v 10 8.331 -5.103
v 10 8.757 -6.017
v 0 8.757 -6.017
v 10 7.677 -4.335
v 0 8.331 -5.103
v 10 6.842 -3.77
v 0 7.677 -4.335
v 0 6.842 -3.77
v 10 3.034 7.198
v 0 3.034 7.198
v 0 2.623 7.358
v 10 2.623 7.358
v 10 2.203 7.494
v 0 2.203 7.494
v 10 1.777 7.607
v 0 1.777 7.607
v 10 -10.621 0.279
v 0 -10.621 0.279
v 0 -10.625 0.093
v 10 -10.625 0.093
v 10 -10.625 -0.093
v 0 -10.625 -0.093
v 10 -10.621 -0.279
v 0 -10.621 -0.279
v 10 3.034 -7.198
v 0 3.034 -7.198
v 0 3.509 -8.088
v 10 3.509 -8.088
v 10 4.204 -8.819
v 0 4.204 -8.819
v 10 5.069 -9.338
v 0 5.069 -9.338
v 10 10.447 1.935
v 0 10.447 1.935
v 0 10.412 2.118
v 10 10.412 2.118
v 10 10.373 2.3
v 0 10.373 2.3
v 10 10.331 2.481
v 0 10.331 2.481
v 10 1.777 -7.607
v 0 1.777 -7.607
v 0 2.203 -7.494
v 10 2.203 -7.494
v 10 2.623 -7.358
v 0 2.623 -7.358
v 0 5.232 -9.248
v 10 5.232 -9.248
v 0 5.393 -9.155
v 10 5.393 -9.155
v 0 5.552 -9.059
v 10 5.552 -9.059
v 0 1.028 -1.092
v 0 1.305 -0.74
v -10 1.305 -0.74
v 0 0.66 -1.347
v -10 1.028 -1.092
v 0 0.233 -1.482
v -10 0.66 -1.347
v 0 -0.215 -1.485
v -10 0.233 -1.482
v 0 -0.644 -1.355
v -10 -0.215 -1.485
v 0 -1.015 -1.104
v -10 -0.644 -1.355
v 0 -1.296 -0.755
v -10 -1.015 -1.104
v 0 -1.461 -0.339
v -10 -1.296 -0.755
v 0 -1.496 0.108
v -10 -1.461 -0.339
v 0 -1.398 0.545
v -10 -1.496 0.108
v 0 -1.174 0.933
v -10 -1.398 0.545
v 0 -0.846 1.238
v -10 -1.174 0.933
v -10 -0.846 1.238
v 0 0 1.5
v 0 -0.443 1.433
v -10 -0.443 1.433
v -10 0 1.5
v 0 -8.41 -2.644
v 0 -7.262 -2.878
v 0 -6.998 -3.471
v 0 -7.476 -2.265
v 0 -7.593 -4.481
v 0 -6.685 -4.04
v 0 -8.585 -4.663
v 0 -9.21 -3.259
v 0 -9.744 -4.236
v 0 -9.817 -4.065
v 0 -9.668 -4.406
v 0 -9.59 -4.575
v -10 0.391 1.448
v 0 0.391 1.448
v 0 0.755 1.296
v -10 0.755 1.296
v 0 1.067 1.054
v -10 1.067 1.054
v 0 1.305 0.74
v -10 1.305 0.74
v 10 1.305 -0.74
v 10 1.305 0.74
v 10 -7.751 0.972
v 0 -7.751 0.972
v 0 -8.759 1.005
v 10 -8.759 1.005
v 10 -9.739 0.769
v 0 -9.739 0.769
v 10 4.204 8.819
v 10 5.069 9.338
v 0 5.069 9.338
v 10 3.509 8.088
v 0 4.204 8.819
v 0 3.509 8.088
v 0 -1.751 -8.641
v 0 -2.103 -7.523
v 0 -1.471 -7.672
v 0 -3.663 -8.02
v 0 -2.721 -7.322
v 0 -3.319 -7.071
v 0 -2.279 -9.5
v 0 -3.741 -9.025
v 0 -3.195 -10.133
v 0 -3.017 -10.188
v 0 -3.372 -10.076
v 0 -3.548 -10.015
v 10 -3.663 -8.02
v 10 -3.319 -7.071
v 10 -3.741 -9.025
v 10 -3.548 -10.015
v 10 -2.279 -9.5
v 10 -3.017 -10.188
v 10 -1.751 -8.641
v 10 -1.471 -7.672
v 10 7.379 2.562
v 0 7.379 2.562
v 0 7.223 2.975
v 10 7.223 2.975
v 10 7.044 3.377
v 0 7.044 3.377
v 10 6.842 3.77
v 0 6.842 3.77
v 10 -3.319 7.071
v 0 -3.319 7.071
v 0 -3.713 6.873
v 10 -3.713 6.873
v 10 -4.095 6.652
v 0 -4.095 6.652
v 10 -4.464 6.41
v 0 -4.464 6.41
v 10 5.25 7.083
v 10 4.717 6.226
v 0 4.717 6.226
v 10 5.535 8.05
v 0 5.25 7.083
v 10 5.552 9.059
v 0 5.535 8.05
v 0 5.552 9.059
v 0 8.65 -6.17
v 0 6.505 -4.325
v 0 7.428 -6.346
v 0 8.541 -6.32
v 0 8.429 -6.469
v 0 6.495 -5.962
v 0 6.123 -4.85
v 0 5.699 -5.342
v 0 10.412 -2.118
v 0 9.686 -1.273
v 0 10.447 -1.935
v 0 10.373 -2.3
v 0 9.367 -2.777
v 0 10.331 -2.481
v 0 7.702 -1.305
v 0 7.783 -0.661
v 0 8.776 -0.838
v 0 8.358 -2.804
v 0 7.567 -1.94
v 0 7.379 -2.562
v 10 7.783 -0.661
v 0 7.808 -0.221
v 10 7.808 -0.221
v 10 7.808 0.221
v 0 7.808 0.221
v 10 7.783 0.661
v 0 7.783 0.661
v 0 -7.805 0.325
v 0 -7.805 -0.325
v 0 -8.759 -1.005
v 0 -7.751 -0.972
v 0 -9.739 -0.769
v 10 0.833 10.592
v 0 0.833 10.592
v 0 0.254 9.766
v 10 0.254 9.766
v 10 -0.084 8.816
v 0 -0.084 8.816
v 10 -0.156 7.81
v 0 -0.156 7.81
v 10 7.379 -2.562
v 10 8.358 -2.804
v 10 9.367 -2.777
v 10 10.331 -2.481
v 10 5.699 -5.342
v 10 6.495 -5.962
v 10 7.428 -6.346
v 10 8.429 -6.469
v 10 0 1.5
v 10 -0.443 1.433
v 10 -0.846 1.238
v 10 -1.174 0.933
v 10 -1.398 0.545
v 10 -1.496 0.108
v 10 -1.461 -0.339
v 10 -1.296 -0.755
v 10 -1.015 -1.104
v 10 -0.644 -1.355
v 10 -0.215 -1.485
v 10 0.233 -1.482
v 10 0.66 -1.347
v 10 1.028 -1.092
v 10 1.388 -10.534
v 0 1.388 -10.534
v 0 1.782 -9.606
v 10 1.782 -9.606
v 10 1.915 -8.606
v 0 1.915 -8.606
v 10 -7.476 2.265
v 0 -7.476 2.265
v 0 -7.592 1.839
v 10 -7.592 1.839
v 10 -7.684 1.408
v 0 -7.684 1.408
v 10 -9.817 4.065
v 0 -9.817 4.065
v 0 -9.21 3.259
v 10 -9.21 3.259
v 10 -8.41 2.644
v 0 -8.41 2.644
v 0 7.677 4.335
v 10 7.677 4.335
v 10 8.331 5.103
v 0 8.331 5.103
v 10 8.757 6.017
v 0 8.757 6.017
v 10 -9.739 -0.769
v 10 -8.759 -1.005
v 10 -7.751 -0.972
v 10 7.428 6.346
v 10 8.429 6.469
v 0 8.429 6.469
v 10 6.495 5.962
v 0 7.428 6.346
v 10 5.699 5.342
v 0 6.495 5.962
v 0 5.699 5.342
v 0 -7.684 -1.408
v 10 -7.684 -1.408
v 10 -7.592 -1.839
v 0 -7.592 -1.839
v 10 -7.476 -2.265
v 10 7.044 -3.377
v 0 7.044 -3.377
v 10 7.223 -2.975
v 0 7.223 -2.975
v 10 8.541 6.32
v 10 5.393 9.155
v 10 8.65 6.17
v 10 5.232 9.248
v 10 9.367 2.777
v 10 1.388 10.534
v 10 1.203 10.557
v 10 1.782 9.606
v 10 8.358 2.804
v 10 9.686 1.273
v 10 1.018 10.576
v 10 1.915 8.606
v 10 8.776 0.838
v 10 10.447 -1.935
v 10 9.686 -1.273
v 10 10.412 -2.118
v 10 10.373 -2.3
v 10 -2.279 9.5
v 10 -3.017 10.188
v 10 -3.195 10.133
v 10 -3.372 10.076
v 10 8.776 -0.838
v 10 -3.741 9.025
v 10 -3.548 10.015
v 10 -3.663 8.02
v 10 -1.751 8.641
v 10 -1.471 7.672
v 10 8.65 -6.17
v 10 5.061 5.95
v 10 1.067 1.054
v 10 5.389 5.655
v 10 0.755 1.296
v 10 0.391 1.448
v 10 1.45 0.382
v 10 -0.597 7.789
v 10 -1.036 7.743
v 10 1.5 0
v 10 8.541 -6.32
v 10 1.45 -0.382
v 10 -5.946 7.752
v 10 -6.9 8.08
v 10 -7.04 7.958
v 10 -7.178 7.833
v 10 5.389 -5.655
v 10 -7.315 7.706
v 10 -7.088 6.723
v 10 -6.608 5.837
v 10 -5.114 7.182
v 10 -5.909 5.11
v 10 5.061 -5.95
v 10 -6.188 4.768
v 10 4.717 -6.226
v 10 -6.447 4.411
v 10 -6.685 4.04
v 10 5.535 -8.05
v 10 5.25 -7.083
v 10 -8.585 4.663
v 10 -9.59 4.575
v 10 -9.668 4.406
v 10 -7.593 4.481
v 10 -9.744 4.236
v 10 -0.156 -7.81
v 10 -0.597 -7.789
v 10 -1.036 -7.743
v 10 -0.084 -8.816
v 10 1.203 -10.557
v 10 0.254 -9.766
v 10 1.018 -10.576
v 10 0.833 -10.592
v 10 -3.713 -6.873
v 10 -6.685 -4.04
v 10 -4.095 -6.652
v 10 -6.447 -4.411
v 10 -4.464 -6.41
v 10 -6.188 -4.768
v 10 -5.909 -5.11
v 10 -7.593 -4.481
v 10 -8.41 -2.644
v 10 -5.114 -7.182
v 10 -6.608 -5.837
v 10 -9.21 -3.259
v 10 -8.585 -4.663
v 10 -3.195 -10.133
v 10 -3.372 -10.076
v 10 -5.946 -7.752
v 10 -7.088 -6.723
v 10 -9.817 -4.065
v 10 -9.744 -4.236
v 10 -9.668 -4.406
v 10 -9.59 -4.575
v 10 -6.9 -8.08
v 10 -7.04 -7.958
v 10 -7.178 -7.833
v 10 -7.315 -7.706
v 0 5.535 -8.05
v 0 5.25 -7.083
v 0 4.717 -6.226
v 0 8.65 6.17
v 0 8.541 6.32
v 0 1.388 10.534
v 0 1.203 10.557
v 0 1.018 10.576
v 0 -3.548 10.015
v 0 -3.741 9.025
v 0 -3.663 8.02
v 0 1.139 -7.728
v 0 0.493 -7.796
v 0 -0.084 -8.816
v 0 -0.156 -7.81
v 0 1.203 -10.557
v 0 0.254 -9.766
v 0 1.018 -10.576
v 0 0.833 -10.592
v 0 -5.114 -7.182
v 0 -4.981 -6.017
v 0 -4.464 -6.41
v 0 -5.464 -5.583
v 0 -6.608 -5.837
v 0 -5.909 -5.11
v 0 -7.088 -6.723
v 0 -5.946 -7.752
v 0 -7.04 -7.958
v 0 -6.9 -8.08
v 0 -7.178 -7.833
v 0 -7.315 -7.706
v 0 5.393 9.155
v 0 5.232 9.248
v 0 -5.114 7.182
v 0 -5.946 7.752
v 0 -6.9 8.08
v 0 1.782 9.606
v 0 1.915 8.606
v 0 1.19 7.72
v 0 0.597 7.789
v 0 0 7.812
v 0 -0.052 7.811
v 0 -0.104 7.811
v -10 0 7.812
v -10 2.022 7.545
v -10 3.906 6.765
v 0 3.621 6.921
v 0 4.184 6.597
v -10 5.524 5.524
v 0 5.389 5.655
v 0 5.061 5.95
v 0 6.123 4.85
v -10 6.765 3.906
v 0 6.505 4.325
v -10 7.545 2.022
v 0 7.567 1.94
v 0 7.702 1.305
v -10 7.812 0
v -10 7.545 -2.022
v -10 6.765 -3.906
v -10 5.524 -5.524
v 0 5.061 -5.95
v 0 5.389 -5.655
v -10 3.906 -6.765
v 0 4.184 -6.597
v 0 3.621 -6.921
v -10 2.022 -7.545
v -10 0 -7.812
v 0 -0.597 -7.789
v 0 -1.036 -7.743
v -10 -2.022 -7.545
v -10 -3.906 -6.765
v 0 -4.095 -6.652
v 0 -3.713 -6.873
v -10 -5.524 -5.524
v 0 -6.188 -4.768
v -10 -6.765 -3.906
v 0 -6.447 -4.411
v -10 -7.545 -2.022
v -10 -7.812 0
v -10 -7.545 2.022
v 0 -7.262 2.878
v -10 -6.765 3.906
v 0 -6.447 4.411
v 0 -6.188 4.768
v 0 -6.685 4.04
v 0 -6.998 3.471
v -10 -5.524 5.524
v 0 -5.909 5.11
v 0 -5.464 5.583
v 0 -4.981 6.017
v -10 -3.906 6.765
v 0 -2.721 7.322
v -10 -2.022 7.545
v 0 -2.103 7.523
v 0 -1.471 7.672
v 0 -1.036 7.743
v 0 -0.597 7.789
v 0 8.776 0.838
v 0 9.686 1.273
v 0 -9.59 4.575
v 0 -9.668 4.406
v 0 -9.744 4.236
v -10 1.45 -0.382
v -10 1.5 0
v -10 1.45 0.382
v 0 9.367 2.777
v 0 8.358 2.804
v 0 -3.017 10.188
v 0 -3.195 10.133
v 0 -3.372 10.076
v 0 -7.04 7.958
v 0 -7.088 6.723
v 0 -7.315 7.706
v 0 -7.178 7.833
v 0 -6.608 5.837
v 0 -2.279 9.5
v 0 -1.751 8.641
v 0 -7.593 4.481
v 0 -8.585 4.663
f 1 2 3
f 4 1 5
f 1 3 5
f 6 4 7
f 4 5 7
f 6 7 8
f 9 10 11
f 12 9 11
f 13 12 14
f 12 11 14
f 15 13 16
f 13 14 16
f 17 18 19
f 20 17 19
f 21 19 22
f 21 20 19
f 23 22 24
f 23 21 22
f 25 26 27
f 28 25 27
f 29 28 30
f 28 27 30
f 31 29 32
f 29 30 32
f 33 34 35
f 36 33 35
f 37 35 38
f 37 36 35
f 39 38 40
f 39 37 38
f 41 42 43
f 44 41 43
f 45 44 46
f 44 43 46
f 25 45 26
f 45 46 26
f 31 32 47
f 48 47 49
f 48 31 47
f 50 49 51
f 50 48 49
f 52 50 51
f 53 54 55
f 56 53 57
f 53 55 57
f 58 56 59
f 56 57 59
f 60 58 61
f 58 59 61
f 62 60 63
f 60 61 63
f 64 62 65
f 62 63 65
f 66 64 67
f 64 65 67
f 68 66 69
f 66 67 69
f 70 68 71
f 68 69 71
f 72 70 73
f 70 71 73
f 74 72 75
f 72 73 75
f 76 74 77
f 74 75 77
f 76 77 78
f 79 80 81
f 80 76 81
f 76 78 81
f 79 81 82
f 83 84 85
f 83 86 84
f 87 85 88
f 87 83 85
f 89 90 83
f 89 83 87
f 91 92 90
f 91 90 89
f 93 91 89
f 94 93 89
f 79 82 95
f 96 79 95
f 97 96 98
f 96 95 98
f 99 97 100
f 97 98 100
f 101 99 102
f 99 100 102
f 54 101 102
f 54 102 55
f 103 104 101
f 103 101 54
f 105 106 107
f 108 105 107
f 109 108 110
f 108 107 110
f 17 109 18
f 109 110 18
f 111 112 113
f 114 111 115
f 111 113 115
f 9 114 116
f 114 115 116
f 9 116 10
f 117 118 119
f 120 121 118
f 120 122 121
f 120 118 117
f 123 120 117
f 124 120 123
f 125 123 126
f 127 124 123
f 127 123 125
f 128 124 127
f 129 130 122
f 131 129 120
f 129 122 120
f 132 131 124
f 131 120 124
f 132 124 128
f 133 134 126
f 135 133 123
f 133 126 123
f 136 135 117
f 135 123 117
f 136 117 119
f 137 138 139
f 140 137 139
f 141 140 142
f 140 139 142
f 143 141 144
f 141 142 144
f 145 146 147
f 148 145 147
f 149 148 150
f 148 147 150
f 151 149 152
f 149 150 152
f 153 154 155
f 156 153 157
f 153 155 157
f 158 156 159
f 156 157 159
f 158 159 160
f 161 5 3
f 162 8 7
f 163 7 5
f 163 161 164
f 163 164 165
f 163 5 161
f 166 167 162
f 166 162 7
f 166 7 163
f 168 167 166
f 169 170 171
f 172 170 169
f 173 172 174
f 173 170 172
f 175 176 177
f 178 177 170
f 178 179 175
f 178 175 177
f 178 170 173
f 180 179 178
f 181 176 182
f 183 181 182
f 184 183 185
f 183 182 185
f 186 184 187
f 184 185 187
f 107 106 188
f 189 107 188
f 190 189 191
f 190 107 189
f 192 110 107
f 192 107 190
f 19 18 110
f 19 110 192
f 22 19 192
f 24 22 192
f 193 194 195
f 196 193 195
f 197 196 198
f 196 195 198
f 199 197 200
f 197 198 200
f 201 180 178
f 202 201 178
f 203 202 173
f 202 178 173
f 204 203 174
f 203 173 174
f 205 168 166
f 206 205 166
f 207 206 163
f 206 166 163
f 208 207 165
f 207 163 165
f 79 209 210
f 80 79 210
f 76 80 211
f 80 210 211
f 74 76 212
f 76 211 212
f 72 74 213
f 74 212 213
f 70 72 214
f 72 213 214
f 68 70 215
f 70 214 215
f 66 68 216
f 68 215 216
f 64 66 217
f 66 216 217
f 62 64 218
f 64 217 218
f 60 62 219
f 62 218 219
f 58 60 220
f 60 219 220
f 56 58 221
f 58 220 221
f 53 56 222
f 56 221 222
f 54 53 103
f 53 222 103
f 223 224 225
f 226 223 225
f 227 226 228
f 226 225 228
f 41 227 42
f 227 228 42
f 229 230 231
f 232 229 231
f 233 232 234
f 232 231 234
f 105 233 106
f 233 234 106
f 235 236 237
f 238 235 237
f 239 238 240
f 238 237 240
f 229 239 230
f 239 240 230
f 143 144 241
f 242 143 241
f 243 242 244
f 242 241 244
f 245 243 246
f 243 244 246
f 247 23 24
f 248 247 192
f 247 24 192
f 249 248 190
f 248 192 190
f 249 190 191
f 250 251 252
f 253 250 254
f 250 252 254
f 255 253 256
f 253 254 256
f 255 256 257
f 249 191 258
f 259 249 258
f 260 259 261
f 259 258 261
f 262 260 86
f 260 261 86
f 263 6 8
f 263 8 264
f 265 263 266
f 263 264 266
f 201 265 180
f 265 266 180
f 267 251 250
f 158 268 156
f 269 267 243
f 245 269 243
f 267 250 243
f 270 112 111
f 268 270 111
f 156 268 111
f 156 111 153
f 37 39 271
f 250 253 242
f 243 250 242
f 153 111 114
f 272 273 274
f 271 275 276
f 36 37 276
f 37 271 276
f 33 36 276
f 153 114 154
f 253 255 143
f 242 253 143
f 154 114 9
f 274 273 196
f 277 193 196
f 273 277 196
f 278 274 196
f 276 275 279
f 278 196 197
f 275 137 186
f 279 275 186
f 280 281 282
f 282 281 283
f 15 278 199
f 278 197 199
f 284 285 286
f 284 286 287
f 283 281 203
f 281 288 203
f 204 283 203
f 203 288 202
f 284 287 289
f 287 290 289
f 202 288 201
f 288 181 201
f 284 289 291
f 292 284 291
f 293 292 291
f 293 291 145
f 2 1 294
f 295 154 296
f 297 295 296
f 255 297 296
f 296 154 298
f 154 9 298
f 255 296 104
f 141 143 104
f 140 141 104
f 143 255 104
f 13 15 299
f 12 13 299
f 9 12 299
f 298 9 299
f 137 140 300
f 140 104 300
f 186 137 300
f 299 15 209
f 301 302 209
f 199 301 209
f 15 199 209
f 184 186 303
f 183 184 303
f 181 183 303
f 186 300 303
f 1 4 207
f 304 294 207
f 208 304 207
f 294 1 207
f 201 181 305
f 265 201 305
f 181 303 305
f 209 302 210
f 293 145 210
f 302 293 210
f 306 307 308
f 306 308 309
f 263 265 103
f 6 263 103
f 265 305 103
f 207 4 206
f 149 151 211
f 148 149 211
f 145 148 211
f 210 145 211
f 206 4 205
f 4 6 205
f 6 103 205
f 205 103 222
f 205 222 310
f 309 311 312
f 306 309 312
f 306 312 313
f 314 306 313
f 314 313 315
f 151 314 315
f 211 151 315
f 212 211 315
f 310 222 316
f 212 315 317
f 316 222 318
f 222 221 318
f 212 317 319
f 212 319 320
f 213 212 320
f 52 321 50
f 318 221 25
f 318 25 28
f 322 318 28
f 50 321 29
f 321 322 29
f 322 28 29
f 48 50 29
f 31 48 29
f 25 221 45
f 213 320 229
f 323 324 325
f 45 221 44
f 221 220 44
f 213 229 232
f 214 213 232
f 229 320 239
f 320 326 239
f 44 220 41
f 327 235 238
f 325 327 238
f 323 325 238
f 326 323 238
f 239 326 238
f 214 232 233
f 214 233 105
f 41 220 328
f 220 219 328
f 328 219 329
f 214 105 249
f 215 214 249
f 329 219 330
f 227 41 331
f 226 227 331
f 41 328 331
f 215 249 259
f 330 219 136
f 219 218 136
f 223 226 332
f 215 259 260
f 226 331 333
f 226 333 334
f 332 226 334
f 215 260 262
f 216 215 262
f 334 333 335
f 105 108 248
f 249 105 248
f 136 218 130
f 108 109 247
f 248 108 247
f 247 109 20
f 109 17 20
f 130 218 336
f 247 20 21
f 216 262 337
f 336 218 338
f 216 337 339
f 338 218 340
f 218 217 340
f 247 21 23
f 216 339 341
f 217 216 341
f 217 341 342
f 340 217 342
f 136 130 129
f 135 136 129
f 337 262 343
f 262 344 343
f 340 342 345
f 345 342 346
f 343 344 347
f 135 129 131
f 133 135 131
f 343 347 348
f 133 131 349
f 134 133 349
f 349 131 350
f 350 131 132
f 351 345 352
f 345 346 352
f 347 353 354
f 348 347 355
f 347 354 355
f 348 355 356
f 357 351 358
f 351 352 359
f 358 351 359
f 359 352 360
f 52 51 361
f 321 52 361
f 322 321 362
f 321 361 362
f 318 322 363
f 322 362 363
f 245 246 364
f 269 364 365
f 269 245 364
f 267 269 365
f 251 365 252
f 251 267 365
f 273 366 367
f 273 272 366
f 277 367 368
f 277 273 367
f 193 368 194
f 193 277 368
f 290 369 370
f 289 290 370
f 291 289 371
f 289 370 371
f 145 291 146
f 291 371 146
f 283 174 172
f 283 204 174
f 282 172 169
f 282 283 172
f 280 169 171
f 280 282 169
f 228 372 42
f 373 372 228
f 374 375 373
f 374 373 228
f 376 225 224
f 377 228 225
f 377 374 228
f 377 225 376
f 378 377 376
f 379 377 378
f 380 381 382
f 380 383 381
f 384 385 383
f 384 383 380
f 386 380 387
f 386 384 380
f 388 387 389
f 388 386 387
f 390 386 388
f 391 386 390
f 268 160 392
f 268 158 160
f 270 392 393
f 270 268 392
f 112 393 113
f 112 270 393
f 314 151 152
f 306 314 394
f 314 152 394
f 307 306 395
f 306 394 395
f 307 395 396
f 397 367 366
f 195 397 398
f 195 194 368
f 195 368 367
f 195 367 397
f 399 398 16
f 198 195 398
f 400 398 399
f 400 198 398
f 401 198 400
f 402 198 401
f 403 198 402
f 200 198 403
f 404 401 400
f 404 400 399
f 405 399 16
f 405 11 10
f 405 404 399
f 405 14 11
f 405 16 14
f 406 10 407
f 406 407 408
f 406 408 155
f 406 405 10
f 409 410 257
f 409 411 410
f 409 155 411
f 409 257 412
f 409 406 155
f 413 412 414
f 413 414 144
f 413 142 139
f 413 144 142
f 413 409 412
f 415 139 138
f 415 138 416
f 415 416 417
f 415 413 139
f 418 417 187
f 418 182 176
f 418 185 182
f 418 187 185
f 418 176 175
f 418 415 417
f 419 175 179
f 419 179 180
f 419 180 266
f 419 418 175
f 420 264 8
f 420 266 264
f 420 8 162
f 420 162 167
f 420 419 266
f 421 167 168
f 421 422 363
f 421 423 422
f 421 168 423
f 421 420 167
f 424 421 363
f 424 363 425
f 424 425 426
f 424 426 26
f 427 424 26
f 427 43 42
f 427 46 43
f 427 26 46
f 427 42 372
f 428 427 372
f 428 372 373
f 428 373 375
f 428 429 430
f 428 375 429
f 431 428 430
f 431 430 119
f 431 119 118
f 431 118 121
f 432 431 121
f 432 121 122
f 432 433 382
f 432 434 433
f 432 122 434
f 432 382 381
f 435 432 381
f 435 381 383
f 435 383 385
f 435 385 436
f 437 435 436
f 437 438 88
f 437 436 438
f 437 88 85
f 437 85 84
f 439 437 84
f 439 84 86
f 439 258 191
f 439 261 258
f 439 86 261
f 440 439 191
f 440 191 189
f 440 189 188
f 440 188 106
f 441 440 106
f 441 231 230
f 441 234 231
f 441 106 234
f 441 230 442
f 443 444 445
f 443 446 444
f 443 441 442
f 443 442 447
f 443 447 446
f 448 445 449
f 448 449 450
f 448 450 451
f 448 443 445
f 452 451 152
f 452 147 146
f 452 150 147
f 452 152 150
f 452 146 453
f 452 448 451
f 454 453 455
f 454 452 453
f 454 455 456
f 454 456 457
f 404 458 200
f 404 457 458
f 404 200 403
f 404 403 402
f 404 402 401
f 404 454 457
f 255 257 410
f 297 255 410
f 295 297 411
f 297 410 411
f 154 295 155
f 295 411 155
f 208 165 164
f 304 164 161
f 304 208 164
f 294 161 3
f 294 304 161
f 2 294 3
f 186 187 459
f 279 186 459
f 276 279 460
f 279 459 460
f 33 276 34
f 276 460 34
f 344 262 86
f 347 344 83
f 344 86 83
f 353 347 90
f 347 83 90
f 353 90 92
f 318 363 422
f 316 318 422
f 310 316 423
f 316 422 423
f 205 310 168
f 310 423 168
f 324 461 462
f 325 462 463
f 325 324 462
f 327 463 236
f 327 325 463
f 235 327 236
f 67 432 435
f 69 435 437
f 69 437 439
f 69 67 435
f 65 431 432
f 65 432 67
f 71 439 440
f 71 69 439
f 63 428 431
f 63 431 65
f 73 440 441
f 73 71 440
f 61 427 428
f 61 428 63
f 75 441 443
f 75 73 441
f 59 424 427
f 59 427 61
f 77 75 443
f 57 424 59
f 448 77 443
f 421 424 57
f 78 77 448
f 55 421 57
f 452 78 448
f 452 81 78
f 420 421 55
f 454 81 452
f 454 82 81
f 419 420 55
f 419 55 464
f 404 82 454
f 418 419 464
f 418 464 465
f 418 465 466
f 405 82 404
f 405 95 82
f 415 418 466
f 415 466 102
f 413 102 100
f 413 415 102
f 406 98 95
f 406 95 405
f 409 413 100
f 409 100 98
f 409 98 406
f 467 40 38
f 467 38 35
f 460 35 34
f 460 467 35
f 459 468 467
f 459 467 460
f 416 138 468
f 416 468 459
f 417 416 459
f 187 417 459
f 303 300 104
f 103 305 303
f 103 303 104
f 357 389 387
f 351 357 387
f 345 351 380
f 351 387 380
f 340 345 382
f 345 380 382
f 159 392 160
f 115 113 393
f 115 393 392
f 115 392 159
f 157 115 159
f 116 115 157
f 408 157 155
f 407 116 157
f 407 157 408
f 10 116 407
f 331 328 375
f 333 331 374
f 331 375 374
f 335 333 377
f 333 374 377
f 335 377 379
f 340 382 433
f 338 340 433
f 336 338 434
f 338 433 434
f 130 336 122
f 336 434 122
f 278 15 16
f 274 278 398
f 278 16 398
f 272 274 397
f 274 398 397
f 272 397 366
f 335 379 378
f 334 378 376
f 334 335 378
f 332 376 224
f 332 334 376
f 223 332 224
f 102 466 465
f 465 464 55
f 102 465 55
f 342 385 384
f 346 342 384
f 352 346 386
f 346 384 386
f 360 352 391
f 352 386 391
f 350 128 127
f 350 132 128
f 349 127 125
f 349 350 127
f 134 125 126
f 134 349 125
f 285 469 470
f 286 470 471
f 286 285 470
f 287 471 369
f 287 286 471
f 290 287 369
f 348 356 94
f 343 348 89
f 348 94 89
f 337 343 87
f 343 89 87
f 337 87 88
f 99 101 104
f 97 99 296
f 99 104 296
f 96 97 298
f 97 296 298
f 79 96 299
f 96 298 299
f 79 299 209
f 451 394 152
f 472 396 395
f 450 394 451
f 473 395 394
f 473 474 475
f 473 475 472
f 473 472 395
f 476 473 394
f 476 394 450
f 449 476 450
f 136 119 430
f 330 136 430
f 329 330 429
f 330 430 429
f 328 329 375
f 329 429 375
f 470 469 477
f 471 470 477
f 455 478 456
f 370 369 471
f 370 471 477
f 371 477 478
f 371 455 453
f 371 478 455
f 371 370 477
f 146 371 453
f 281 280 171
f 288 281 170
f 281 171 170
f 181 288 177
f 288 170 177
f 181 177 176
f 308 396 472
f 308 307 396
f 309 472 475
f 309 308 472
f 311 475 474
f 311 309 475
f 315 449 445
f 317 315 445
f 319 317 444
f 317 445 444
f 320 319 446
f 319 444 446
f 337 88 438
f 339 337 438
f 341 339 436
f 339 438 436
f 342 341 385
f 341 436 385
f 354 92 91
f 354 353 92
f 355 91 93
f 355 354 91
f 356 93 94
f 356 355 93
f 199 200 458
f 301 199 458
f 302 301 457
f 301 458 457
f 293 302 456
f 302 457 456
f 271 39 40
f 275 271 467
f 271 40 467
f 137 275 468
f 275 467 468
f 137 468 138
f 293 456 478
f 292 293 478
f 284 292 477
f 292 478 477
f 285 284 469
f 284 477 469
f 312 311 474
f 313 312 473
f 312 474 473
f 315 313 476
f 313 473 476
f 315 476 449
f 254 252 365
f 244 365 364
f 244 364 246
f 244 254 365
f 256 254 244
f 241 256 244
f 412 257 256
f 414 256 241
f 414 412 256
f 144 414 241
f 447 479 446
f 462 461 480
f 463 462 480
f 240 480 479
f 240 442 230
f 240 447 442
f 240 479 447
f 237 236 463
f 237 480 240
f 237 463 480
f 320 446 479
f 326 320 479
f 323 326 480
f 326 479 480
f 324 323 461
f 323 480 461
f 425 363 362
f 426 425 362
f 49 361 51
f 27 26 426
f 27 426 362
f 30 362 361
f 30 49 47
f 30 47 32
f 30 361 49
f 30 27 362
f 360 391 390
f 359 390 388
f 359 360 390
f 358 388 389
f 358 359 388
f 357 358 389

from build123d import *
from build123d.topology import SkipClean

# Parameters (mm, degrees)
BASPROSKE_W         = 10
BASPROSKE_H         = 10.625
TOOTHCUT_DEPTH      = 19.049411348
TEETHCUTS_COUNT     = 15
TEETHCUTS_ANGLE     = 336
BORSKE_R            = 1.5
BORE_DEPTH          = 50.0000508
BOSS_EXTRUDE1_START = 10
SKETCH1_R           = 7.8115
SKETCH1_R_2         = 1.5
BOSS_EXTRUDE1_DEPTH = 10
BOSS_EXTRUDE2_DEPTH = 20


with BuildPart() as part:
    # BasProSke → Base-Revolve (revolve)
    with BuildSketch(Plane(origin=(0, 0, 0), x_dir=(1, 0, 0), z_dir=(0, 1, 0)), mode=Mode.PRIVATE) as base_revolve_sk:
        with Locations((5, 5.3125)):
            Rectangle(BASPROSKE_W, BASPROSKE_H)
    revolve(base_revolve_sk.sketch.rotate(Axis((-10, 0, 0), (1, 0, 0)), 180), axis=Axis((-10, 0, 0), (1, 0, 0)))

    # TooCutSke → ToothCut (cut, through all)
    with BuildSketch(Plane(origin=(0, 0, 0), x_dir=(0, 0, -1), z_dir=(1, 0, 0))):
        with BuildLine():
            ThreePointArc((0.660831632, 7.78349753), (0, 7.8115), (-0.660831632, 7.78349753))
            ThreePointArc((-0.660831632, 7.78349753), (-1.031814994, 9.260718016), (-1.959681305, 10.46855622))
            ThreePointArc((-1.959681305, 10.46855622), (0, 10.6504), (1.959681305, 10.46855622))
            ThreePointArc((1.959681305, 10.46855622), (1.031814994, 9.260718016), (0.660831632, 7.78349753))
        make_face()
    toothcut = extrude(amount=TOOTHCUT_DEPTH, mode=Mode.SUBTRACT)

    # TeethCuts: ToothCut ×15 about axis
    teethcuts_axis = Axis((-10, 0, 0), (1, 0, 0))
    for i in range(1, TEETHCUTS_COUNT):
        add(toothcut.rotate(teethcuts_axis, i * TEETHCUTS_ANGLE / (TEETHCUTS_COUNT - 1)), mode=Mode.SUBTRACT)

    # BorSke → Bore (cut, symmetric)
    with BuildSketch(Plane(origin=(0, 0, 0), x_dir=(0, 0, -1), z_dir=(1, 0, 0))):
        with Locations(Location((0, 0, 0), (0, 0, 180))):
            Circle(BORSKE_R)
    extrude(amount=BORE_DEPTH, both=True, mode=Mode.SUBTRACT)

    # Sketch1 → Boss-Extrude1 (add)
    with SkipClean():  # the faces are left unmerged after this step: merging them gives an invalid solid
        with BuildSketch(Plane.ZY.offset(BOSS_EXTRUDE1_START)):
            Circle(SKETCH1_R)
            Circle(SKETCH1_R_2, mode=Mode.SUBTRACT)
        extrude(amount=-BOSS_EXTRUDE1_DEPTH)

    # Sketch2 → Boss-Extrude2 (add)
    with SkipClean():  # the faces are left unmerged after this step: merging them gives an invalid solid
        with BuildSketch(Plane(origin=(10, 0, 0), x_dir=(0, 0, -1), z_dir=(1, 0, 0))):
            with BuildLine():
                ThreePointArc((0.739577582, 1.305), (0, 1.5), (-0.739577582, 1.305))
                Line((-0.739577582, 1.305), (0.739577582, 1.305))
            make_face()
        extrude(amount=-BOSS_EXTRUDE2_DEPTH)


solid = part.part
